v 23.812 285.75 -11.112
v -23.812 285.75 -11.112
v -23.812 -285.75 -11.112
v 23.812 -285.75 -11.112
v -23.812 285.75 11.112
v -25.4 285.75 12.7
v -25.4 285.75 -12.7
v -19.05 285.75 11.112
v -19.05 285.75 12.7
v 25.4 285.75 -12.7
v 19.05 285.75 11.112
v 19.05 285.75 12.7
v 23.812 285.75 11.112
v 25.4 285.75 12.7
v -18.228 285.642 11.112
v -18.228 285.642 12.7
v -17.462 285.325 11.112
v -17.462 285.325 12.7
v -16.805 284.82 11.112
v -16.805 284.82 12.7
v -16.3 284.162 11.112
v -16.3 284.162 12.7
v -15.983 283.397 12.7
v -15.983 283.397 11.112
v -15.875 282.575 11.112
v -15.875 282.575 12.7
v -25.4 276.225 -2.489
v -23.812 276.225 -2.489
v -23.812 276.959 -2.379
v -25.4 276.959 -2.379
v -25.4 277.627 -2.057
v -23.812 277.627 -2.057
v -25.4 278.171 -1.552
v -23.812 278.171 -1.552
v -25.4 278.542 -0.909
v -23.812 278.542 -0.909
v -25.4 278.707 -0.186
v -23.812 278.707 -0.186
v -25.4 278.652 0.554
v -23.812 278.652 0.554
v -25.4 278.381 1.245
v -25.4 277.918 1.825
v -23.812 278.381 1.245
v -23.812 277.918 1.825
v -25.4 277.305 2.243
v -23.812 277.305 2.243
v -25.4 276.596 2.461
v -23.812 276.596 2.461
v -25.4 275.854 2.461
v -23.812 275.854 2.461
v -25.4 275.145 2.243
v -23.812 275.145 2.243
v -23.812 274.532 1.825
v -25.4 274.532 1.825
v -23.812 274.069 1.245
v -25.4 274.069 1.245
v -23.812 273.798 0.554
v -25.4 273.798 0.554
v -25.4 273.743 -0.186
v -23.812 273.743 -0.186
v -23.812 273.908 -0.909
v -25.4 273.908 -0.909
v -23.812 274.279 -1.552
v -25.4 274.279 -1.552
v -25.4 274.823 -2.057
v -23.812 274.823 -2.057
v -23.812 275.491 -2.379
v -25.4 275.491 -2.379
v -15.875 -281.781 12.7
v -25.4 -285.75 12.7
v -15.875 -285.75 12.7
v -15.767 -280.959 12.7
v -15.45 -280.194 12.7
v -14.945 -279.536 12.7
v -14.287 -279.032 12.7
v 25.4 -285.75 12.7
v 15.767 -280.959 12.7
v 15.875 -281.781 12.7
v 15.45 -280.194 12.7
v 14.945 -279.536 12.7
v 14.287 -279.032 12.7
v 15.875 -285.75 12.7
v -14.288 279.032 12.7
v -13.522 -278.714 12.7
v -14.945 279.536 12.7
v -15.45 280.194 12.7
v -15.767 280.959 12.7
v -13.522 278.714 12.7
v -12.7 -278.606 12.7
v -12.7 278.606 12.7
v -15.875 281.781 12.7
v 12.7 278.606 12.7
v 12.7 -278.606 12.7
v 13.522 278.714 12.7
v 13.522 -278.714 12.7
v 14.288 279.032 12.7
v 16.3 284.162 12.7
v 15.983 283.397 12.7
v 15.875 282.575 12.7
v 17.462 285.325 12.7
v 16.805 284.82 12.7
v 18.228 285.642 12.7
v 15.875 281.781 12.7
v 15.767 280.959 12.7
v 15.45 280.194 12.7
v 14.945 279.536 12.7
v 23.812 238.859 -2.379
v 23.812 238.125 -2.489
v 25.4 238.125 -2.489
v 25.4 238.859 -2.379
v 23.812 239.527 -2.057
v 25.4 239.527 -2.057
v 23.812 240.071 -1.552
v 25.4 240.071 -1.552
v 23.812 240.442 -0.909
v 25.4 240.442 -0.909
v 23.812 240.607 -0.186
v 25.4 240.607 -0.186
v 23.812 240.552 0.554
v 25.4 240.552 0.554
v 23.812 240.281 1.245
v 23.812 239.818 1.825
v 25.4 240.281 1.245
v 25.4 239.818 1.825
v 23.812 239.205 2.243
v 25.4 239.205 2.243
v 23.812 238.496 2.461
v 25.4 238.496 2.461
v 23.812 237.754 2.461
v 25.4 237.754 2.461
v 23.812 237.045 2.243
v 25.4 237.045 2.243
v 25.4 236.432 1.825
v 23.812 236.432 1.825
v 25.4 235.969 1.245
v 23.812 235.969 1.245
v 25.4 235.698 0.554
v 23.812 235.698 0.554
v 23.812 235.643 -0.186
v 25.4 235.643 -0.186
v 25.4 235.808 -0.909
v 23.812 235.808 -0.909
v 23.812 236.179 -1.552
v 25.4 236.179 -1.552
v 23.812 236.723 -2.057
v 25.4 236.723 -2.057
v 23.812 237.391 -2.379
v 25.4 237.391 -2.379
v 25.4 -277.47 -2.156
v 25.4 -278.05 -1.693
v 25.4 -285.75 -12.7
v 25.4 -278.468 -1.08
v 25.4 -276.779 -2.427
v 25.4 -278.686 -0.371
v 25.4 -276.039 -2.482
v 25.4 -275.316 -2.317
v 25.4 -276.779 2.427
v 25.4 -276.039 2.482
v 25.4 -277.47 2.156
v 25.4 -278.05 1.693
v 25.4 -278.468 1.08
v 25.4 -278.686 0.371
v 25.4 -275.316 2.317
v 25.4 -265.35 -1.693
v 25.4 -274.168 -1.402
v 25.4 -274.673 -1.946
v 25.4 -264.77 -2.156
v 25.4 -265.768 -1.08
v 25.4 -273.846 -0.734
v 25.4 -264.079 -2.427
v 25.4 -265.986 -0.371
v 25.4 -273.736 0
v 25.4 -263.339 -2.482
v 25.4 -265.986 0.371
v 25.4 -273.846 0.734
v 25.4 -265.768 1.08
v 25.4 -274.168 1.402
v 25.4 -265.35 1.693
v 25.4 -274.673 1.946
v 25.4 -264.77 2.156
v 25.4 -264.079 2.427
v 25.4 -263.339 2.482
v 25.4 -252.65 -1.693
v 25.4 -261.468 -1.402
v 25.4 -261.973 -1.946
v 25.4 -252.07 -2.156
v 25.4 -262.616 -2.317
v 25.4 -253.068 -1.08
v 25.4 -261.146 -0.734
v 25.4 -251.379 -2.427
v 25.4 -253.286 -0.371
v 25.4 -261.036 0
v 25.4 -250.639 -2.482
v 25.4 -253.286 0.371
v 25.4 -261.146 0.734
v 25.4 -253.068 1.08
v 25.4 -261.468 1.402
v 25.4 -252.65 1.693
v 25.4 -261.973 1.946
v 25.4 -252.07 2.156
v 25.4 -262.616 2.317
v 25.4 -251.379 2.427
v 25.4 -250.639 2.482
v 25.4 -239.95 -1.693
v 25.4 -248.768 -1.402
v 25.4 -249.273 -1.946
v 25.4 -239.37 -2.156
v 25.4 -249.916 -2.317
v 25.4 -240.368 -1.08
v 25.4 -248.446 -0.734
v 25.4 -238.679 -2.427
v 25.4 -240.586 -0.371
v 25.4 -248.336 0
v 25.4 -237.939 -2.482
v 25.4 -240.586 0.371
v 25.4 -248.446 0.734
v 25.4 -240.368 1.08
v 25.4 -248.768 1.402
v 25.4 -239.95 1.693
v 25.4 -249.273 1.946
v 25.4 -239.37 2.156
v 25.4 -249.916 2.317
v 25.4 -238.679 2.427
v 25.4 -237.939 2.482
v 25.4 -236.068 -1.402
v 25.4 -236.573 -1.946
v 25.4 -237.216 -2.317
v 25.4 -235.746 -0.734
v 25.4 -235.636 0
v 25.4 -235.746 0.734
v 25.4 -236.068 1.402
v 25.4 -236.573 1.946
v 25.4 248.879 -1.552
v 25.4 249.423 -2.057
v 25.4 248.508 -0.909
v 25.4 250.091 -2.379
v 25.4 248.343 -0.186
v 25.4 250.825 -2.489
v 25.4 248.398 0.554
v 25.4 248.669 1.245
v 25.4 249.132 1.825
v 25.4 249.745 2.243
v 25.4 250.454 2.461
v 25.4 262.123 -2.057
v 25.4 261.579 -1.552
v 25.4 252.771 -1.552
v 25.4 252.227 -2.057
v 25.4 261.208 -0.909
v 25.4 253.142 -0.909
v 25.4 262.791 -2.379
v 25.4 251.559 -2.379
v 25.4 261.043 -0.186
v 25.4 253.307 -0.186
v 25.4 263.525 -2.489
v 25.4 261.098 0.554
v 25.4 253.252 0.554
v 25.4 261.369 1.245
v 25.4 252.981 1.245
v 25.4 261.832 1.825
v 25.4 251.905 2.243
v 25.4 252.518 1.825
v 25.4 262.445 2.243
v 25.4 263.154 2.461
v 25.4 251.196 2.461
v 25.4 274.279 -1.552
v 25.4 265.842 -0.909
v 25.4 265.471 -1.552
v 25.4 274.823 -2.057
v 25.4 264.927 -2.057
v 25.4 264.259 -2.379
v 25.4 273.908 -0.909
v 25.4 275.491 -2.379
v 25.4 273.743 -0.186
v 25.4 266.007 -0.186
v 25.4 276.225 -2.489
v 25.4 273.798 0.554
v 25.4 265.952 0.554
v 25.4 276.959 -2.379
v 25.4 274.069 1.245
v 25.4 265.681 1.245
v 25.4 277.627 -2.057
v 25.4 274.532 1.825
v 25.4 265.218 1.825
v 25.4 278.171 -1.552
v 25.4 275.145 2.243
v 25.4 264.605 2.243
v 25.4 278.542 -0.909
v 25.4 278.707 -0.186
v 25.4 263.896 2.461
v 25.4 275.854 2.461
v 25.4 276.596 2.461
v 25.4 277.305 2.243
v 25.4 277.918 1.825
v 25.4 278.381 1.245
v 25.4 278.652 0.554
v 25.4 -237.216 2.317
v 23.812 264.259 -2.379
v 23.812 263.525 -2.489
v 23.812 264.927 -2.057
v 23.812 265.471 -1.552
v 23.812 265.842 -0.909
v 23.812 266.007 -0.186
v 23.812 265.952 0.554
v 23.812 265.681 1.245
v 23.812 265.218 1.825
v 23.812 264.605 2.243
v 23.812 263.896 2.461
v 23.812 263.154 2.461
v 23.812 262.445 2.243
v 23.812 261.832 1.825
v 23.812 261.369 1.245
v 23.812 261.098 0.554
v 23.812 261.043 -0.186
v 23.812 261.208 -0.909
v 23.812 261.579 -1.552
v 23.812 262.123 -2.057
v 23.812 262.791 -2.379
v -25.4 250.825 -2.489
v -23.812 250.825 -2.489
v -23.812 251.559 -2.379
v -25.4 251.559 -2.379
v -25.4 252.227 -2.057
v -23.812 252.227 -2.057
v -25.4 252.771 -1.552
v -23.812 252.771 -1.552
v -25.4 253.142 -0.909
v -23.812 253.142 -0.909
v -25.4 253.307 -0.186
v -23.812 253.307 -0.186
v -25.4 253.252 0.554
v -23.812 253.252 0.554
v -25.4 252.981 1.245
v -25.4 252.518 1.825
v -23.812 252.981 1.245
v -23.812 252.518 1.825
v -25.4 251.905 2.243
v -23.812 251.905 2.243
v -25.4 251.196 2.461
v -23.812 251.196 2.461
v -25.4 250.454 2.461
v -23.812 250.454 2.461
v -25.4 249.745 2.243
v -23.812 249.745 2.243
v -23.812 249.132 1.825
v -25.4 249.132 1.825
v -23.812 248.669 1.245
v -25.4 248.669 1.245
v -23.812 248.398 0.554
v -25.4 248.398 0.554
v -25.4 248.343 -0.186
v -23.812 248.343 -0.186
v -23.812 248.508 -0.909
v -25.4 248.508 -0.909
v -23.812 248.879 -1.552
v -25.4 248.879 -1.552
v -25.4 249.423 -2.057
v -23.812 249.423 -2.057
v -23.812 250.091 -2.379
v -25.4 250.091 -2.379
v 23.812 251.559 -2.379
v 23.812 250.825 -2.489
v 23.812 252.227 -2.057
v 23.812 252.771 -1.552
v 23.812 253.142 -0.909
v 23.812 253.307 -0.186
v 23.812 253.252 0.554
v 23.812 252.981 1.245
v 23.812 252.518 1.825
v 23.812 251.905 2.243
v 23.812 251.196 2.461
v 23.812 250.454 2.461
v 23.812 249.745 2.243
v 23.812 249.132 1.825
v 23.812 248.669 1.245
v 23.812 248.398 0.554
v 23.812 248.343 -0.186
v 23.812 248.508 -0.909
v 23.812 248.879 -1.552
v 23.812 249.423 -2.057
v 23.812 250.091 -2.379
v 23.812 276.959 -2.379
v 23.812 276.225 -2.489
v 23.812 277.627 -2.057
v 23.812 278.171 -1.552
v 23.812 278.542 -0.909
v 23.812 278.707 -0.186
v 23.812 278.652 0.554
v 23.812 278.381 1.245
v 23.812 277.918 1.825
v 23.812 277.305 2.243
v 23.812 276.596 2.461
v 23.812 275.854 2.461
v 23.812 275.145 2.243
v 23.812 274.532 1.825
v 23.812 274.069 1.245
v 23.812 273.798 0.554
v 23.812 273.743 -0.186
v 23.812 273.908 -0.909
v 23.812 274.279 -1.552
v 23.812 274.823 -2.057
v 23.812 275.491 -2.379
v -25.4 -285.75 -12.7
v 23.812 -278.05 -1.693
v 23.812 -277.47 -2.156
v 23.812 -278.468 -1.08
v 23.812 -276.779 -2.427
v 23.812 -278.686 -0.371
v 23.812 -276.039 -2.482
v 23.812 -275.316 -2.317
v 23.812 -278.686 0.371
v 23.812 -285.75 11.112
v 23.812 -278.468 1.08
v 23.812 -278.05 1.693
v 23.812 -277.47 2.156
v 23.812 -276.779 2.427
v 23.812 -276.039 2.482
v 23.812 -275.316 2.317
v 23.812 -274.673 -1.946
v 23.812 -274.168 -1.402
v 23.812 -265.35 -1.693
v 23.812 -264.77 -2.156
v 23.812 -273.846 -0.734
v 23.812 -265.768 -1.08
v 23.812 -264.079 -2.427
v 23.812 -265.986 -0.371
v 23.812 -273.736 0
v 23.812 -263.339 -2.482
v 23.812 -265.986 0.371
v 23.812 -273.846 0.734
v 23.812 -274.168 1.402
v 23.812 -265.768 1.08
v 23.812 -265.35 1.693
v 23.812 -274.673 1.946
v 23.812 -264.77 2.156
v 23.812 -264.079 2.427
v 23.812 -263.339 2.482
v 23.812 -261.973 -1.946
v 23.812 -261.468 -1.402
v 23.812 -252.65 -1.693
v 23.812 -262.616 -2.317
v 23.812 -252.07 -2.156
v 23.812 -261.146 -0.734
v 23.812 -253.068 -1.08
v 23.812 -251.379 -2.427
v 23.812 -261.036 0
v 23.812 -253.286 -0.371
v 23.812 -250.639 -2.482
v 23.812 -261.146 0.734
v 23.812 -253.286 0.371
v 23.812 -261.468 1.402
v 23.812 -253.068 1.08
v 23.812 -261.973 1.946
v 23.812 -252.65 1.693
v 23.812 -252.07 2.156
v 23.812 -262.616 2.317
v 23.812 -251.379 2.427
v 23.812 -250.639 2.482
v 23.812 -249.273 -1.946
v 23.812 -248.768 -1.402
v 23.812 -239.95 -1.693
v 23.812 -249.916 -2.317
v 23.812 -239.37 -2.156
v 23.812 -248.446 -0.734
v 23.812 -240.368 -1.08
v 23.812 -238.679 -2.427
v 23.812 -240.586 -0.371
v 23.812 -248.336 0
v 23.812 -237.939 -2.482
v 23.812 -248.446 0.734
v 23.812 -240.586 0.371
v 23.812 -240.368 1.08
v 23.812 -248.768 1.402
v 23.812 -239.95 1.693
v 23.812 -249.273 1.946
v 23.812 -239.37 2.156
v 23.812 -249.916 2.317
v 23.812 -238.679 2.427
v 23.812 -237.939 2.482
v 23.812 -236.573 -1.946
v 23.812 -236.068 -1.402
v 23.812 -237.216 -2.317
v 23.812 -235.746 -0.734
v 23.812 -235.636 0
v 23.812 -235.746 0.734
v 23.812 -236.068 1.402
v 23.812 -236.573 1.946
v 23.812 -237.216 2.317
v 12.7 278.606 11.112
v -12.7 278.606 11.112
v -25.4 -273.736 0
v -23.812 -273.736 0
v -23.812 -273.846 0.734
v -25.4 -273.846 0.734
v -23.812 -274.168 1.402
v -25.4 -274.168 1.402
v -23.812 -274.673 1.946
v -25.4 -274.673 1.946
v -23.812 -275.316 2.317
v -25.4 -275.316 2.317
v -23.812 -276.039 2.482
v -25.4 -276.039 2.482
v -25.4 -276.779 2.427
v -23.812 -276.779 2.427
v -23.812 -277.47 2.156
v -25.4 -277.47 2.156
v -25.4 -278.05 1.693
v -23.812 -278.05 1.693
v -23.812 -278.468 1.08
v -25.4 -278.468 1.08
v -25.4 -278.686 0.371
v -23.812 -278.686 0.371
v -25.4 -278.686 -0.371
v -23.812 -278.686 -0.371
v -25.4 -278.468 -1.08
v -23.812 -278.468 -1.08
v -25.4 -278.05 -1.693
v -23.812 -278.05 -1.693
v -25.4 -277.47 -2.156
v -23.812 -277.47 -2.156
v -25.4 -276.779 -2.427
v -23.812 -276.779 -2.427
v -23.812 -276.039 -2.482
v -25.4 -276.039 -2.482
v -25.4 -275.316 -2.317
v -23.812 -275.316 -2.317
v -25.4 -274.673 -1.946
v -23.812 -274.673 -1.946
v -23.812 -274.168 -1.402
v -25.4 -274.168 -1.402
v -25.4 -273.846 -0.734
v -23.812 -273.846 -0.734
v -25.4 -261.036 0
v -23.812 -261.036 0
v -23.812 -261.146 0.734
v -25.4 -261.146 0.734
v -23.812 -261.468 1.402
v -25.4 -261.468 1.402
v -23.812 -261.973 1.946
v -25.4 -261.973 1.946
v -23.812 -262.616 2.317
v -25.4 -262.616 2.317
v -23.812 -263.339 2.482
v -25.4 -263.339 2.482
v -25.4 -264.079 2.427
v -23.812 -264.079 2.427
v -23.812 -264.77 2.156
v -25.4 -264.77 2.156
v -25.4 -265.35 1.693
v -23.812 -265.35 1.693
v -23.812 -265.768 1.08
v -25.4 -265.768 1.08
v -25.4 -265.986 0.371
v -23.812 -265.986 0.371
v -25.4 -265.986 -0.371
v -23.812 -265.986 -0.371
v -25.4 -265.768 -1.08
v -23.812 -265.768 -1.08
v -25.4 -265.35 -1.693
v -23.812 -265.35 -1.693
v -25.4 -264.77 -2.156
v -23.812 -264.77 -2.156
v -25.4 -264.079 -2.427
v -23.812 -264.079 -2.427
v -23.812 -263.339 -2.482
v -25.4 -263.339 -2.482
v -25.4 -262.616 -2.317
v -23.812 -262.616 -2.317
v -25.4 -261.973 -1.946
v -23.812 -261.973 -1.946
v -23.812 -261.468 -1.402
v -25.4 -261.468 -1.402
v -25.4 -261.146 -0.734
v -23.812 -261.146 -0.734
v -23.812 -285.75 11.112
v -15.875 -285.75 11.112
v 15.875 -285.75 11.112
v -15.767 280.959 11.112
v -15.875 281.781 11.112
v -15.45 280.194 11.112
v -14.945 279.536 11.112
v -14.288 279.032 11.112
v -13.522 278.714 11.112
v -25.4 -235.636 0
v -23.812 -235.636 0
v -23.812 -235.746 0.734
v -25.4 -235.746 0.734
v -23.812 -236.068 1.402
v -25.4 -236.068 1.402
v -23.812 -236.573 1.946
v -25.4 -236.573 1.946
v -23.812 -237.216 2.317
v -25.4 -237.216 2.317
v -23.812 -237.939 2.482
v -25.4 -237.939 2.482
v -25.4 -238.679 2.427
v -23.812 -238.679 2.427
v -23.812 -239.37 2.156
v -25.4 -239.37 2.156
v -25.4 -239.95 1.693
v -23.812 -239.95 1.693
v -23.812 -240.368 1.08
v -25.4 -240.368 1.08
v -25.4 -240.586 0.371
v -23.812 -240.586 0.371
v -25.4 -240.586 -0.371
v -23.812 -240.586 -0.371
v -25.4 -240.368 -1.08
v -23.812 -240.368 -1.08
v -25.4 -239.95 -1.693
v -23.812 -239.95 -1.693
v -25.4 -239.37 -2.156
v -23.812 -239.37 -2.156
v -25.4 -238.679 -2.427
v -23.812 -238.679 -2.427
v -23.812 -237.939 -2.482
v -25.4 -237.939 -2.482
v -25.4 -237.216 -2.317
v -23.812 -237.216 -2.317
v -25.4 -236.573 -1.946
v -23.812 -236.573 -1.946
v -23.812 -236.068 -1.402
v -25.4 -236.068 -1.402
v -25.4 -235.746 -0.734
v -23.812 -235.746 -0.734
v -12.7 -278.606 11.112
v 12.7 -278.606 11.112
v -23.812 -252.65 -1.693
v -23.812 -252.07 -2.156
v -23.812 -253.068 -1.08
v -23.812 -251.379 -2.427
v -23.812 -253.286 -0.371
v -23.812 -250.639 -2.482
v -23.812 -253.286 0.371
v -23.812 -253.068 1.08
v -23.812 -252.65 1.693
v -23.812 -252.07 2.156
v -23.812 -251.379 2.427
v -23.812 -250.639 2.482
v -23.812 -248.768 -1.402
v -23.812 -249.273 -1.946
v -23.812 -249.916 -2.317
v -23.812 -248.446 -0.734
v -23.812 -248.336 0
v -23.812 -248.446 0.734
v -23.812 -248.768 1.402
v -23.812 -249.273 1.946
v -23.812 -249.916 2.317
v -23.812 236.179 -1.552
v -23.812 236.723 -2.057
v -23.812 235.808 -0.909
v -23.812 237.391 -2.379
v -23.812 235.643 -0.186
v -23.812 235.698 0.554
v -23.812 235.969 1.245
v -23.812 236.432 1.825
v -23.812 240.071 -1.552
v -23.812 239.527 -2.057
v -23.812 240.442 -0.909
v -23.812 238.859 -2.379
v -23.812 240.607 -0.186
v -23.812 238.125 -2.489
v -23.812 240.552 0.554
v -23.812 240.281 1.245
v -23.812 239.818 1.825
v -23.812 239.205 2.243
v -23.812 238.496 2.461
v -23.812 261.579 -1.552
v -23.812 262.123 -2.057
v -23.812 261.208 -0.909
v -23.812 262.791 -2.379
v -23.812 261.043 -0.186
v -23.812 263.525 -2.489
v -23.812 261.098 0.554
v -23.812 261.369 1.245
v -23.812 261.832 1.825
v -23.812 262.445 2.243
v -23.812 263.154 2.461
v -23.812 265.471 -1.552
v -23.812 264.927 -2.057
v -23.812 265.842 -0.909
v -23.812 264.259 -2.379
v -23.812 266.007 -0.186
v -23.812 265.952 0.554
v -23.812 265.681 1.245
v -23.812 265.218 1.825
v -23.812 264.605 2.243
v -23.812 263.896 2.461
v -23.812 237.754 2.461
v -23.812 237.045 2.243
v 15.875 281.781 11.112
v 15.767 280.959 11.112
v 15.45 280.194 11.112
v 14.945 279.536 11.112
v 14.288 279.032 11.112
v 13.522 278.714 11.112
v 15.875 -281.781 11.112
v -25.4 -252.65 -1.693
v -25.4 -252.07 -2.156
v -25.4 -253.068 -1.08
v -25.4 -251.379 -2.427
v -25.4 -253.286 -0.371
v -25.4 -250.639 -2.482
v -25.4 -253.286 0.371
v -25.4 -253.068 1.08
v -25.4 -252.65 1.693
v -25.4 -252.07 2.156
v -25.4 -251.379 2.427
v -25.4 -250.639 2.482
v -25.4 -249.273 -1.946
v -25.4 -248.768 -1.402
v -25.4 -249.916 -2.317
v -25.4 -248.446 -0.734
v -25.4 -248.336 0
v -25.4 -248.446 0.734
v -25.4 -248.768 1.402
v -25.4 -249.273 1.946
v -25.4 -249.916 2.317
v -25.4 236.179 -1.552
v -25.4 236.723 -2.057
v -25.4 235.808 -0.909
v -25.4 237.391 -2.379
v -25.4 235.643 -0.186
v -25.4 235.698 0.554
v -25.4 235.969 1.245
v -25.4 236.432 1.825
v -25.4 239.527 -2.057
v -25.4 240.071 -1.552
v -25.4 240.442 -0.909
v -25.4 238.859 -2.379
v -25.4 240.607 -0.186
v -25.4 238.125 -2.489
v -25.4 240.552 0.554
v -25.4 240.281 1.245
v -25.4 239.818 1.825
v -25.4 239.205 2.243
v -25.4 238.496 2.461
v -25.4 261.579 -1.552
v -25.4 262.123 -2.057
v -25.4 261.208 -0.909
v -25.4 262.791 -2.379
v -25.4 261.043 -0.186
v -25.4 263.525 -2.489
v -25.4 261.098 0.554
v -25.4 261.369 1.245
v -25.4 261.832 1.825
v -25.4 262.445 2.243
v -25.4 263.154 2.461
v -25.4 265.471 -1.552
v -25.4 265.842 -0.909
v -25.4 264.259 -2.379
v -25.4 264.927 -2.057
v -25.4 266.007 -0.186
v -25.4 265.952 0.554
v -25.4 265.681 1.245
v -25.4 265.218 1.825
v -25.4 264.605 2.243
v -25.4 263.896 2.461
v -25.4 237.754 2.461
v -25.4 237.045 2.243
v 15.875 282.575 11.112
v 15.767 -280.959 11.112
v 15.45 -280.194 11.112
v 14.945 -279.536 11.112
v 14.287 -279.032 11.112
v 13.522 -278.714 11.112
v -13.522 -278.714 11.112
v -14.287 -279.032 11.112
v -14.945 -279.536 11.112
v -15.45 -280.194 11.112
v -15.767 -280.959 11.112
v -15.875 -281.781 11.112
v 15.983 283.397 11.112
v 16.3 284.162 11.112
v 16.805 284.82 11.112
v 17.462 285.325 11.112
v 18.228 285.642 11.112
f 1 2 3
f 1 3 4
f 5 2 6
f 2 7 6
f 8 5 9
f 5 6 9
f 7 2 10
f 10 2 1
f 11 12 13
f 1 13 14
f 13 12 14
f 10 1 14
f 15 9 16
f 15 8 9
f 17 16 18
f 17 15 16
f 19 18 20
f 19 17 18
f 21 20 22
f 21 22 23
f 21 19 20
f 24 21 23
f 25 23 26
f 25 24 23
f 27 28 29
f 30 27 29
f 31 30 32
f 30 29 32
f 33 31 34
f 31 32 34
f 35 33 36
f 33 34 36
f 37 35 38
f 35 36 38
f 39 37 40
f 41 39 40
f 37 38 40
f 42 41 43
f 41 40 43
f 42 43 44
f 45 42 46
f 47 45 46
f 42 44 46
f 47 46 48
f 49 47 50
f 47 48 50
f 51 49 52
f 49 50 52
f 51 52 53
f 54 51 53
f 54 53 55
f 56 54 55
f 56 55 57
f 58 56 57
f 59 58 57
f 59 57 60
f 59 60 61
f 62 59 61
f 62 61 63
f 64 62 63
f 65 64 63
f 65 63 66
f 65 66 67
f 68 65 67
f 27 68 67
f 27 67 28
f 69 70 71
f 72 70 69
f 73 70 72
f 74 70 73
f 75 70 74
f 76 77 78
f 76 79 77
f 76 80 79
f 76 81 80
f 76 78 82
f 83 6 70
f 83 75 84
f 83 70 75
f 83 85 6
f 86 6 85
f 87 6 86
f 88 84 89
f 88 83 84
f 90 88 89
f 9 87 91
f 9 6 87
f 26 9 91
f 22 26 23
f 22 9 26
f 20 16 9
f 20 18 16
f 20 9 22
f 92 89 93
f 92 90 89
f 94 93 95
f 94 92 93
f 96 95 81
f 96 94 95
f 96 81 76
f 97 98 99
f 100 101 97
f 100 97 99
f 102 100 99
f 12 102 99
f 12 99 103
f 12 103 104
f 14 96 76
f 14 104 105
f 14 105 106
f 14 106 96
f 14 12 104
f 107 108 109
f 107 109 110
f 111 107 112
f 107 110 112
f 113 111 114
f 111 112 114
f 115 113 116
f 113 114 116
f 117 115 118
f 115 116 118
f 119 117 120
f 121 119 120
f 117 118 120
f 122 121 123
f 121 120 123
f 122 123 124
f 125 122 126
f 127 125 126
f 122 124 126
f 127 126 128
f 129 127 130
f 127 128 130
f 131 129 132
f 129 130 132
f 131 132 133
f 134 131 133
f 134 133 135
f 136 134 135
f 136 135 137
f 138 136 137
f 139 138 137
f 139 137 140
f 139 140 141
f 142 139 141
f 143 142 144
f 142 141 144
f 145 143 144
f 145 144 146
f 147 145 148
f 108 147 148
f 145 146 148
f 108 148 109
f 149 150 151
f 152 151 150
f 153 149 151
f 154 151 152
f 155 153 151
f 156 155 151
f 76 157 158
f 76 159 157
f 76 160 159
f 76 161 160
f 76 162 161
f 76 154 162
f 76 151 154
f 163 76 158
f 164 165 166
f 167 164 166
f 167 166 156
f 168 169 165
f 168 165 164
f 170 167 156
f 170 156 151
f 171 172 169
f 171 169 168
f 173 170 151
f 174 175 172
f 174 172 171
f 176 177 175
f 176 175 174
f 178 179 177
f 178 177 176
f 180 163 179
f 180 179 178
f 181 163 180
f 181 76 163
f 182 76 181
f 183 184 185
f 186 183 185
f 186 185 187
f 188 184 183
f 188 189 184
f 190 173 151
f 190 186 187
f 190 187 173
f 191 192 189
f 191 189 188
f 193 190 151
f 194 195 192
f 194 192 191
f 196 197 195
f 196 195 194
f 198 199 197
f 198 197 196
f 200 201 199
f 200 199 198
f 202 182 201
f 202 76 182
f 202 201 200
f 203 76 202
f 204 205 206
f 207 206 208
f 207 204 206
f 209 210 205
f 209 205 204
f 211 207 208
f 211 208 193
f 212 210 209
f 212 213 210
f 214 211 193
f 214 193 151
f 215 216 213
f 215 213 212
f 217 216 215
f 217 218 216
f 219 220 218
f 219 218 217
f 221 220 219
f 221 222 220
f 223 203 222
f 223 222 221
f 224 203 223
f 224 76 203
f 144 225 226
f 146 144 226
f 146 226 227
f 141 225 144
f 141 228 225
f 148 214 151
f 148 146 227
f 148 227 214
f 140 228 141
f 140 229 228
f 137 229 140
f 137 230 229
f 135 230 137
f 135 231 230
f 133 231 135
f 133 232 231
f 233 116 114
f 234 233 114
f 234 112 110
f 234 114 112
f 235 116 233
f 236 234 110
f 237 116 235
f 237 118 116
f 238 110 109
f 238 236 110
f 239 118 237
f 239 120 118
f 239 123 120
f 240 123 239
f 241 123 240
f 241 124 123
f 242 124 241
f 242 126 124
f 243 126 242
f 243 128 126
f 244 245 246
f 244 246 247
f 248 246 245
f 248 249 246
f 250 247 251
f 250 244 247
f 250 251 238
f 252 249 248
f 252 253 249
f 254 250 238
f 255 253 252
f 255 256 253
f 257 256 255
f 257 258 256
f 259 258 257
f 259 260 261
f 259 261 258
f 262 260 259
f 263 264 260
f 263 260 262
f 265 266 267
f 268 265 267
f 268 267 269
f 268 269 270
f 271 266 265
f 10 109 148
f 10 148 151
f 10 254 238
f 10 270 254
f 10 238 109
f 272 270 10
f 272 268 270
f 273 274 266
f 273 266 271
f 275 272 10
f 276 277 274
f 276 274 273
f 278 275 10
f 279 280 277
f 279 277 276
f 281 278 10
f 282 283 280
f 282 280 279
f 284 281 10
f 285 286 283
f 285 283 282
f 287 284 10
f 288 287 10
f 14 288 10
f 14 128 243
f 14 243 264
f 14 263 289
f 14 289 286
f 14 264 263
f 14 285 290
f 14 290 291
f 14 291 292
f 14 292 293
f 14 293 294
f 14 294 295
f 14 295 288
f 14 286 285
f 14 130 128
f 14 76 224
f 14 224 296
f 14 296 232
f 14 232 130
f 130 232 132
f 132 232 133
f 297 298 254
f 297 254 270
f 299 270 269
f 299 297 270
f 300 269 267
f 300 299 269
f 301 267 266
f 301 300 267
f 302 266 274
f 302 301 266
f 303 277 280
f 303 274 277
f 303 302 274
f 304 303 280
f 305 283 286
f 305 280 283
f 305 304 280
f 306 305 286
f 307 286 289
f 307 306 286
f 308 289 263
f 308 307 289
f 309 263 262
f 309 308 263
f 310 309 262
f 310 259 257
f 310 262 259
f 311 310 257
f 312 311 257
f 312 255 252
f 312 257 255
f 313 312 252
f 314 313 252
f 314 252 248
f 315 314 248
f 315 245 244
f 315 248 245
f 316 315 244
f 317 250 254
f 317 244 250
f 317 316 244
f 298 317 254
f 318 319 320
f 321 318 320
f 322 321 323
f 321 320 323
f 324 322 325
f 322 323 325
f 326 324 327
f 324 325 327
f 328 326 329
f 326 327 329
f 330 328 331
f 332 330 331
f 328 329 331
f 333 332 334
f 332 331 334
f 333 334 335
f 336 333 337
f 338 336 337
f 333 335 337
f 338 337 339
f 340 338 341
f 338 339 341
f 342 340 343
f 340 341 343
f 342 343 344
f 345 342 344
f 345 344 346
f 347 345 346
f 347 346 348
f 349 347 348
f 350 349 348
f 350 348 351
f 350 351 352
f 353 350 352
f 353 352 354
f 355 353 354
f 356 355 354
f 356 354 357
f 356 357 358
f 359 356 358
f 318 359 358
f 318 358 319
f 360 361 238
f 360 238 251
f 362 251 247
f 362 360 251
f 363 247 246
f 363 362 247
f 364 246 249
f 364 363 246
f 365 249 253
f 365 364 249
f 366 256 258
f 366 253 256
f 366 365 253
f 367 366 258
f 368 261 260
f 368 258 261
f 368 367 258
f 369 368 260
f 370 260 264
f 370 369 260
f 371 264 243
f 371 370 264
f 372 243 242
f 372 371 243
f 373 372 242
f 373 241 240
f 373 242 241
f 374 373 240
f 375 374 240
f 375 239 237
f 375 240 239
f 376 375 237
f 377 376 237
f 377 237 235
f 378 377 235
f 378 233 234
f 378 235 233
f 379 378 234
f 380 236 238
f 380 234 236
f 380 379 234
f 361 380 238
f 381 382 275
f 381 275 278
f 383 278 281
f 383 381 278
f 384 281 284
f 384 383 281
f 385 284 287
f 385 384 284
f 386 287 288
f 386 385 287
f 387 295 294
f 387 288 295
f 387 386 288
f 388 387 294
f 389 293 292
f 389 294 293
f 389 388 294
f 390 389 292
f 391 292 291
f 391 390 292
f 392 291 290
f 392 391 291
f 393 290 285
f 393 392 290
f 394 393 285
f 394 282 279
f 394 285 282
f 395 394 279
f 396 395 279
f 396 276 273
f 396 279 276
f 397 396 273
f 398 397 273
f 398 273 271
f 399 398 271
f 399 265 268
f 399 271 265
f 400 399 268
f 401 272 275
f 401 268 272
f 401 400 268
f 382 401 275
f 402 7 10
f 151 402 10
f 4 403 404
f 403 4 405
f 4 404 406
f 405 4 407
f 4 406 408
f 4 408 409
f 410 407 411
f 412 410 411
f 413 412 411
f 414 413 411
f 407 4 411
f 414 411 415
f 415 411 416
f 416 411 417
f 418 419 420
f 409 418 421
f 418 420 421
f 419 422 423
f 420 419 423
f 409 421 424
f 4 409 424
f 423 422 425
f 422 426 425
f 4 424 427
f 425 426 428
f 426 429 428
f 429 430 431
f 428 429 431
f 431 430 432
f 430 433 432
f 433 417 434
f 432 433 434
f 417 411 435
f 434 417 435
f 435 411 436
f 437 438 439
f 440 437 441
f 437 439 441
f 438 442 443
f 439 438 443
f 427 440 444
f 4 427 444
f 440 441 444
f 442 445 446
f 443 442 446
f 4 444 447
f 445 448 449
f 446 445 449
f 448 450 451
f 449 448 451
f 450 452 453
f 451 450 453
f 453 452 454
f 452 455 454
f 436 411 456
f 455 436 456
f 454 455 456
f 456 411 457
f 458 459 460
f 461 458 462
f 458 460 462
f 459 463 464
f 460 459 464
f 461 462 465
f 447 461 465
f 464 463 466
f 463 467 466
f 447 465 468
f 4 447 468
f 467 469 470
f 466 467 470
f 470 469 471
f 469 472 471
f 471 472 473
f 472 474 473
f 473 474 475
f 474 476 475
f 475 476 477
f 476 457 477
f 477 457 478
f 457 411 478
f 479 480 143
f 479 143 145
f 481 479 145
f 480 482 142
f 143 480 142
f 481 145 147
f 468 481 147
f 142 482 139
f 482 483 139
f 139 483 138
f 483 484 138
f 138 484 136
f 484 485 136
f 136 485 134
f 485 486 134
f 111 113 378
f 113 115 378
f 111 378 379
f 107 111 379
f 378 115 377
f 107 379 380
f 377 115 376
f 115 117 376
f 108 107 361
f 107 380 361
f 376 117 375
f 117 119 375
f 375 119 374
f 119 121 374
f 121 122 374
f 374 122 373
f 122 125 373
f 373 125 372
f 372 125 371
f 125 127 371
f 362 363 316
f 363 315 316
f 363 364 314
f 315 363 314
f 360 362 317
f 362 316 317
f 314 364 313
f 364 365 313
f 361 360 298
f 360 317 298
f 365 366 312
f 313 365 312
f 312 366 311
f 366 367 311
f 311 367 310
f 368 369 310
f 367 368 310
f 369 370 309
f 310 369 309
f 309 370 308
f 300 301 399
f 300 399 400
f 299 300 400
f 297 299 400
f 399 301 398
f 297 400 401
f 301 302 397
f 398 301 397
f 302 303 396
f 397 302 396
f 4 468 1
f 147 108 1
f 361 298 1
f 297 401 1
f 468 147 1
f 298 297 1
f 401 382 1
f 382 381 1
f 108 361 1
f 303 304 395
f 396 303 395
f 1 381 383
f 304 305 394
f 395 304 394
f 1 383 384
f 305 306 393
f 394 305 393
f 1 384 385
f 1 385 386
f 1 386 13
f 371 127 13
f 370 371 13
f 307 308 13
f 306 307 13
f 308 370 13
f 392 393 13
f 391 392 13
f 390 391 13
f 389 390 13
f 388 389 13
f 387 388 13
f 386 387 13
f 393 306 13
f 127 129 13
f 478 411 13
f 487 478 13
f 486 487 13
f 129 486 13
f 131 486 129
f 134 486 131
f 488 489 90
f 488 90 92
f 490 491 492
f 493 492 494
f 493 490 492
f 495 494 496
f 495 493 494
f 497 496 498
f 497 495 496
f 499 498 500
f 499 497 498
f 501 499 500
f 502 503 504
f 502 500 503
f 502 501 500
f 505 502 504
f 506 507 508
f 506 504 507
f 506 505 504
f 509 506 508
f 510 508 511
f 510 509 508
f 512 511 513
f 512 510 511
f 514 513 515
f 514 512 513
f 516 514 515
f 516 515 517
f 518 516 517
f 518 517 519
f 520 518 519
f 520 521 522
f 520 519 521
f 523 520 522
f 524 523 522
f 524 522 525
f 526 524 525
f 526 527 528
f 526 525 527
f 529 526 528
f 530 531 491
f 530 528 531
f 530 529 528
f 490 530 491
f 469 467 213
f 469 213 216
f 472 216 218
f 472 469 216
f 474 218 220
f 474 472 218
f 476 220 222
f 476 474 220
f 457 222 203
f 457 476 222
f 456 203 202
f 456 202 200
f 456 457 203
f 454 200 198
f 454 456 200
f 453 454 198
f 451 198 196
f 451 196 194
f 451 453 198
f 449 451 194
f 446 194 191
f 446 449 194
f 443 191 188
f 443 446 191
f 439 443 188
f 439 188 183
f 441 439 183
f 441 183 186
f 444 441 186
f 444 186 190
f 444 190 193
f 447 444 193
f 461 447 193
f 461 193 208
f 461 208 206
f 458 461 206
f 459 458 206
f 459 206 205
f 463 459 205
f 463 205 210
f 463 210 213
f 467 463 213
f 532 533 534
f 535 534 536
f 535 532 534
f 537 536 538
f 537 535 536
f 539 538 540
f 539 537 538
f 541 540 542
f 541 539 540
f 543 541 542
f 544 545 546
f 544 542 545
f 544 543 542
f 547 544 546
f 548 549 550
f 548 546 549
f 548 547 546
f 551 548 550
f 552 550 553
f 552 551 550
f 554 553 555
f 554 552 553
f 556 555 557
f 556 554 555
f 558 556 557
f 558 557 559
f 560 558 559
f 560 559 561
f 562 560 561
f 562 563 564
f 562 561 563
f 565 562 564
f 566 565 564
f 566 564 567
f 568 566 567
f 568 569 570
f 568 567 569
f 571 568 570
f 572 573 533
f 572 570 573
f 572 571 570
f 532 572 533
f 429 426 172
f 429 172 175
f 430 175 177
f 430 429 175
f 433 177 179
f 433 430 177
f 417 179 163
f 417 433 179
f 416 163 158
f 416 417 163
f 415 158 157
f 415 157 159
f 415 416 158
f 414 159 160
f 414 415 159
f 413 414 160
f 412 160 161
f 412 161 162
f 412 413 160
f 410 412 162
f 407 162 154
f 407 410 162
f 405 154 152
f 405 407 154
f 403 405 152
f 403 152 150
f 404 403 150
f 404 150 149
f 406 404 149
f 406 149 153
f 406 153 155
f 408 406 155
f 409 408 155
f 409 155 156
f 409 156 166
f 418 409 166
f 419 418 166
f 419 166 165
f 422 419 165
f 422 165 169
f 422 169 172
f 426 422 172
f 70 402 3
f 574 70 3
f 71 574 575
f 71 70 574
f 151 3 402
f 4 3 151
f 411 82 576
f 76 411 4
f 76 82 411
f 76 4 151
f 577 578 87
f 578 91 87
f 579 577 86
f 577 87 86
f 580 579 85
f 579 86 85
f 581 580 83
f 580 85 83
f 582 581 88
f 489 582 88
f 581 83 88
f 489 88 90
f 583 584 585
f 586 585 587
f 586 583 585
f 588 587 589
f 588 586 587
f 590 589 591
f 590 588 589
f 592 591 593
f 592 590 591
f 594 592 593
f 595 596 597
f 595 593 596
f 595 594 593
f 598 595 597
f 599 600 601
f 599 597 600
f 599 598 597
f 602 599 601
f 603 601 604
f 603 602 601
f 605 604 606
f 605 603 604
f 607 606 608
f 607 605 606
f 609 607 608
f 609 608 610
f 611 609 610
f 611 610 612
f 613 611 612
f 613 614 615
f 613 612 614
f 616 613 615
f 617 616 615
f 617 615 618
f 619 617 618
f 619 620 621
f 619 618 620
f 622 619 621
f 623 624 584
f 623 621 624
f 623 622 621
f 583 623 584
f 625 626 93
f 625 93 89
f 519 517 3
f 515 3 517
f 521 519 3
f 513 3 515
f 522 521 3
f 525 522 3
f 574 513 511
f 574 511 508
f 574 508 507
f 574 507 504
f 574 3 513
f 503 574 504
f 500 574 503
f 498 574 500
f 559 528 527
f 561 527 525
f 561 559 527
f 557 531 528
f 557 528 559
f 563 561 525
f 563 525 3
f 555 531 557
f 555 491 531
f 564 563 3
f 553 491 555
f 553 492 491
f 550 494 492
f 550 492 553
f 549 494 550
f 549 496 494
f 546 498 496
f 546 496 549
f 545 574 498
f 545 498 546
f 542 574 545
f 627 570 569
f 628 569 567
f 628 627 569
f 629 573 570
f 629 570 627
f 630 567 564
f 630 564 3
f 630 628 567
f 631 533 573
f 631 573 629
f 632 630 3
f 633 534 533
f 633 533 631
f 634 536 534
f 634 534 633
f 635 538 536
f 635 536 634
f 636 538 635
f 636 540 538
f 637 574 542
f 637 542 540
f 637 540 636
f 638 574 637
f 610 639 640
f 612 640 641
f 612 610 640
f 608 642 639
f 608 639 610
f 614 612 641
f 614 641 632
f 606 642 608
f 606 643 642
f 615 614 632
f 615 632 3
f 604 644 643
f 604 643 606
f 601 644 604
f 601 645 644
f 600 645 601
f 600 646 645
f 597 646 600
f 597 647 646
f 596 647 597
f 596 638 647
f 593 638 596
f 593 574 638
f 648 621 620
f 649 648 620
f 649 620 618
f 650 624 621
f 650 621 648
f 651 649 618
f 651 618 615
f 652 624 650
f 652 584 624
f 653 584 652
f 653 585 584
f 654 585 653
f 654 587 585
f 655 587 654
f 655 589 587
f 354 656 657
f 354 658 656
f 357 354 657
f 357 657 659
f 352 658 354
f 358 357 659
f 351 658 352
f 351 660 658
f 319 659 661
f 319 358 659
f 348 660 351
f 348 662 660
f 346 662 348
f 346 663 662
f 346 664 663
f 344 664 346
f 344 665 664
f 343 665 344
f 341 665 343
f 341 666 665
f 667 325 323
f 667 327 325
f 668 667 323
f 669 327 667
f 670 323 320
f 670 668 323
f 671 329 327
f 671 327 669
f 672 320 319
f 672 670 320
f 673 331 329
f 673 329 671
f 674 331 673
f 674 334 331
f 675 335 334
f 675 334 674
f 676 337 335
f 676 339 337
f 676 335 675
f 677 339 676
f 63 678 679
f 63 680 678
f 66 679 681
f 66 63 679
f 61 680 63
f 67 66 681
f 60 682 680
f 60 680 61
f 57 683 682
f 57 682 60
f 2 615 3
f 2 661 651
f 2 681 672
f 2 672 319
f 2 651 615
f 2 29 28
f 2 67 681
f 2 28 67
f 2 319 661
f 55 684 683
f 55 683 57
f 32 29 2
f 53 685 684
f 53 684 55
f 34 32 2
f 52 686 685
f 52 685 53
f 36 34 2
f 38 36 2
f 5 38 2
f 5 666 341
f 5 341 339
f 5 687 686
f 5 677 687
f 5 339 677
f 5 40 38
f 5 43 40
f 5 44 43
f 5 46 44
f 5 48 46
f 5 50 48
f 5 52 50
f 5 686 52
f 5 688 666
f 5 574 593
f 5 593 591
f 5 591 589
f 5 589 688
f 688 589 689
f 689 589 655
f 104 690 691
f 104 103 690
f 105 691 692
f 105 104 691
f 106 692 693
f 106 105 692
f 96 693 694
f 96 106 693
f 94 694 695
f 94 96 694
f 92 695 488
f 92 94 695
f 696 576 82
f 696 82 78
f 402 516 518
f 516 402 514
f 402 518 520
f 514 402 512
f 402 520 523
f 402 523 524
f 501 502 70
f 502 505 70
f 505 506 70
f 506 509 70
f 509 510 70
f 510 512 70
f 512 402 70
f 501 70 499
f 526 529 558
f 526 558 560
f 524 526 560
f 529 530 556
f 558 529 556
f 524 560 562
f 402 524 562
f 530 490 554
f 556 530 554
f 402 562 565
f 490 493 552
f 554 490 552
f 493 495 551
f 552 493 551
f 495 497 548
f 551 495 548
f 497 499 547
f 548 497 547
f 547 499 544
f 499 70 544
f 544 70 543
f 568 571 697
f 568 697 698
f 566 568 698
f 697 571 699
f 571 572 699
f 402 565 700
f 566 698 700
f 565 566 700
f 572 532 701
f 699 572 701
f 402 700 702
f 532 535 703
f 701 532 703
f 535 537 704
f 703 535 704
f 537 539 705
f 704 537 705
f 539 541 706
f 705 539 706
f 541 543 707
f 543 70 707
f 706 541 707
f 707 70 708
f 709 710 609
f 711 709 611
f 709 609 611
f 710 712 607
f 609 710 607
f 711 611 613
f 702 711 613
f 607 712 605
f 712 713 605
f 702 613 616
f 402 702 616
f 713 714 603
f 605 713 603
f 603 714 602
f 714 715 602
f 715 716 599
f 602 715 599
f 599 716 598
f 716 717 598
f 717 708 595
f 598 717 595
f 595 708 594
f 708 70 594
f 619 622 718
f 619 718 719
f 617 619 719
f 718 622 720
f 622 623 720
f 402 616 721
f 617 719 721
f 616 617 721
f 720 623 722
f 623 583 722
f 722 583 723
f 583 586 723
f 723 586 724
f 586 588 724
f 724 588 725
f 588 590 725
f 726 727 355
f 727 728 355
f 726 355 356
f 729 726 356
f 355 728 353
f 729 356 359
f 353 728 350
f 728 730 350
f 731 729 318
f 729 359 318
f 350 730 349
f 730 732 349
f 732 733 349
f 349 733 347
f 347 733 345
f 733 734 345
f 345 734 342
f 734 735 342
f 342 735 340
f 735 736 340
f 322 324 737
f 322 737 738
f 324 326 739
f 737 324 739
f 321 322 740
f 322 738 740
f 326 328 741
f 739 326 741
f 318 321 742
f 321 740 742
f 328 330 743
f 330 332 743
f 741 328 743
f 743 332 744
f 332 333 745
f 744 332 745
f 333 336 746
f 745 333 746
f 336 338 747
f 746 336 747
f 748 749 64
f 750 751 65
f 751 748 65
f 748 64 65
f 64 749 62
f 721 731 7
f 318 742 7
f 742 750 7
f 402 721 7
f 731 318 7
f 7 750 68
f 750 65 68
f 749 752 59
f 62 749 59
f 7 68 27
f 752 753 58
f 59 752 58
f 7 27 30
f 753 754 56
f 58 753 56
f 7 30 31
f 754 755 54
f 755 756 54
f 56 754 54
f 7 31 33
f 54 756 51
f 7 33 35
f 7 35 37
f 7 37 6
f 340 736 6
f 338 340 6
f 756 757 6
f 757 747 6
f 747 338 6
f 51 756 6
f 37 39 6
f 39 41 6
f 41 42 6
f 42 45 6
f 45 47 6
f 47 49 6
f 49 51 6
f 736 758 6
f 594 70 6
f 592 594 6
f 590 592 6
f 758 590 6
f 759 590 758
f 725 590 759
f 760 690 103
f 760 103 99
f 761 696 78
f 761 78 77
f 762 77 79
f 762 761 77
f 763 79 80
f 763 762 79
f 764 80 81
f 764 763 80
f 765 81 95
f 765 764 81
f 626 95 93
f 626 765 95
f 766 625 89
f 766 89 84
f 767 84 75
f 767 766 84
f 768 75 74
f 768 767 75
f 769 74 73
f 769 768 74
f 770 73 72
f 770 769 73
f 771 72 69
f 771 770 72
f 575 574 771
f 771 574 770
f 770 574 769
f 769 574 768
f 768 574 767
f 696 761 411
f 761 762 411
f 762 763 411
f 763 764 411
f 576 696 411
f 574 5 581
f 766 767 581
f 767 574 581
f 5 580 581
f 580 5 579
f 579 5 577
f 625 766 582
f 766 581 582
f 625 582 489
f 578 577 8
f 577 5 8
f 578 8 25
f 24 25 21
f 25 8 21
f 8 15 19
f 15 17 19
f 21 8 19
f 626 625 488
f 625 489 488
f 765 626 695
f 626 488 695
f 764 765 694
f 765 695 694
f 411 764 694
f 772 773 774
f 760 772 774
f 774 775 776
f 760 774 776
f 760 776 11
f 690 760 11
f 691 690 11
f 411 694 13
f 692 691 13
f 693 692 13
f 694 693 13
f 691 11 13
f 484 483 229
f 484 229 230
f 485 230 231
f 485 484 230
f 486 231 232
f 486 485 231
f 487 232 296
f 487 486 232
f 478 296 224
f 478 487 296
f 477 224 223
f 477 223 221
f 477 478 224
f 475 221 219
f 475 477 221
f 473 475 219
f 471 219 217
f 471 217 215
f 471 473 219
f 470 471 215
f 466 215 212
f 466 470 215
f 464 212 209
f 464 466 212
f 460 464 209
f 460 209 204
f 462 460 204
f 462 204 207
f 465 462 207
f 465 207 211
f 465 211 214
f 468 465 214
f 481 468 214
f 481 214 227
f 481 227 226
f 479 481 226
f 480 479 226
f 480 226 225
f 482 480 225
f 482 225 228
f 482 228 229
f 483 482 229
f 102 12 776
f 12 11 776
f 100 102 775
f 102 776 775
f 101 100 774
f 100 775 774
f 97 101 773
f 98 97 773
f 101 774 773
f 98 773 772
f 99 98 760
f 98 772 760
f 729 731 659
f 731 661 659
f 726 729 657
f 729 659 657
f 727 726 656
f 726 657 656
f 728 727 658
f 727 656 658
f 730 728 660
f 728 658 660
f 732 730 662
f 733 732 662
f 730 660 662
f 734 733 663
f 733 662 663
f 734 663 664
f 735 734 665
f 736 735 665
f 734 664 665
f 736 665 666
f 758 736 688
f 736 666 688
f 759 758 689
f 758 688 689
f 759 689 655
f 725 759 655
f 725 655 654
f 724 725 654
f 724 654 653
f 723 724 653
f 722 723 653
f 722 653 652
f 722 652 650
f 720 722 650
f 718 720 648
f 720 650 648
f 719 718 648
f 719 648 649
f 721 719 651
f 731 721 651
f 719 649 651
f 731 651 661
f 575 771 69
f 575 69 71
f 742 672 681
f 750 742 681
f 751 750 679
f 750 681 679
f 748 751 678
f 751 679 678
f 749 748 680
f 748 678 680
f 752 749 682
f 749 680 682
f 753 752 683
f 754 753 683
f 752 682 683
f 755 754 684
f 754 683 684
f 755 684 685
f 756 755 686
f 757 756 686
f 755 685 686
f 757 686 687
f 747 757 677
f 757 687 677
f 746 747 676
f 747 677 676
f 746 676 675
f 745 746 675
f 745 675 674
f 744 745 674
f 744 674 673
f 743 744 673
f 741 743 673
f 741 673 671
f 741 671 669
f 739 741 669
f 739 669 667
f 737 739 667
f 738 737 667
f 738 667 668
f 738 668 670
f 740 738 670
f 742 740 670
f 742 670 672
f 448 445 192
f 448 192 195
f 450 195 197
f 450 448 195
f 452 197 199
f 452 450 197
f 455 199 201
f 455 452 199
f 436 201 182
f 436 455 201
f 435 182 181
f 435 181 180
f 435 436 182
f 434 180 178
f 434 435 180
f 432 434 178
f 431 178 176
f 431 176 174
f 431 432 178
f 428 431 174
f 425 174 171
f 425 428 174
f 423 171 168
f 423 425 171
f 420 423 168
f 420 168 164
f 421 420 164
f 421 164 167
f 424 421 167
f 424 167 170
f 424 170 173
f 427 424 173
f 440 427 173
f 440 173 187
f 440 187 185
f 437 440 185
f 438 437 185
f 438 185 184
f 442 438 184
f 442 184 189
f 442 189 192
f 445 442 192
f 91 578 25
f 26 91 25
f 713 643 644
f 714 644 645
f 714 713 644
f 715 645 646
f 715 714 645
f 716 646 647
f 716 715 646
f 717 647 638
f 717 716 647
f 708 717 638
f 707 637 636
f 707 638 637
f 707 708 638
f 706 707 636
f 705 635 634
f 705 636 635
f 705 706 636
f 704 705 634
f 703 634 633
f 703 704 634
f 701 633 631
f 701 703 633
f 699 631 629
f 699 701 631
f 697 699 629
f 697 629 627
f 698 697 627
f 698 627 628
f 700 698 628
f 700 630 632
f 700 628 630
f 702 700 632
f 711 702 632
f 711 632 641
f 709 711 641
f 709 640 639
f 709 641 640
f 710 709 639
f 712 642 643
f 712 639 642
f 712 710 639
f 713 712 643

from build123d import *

# Parameters (mm, degrees)
SKETCH1_W           = 50.8
SKETCH1_H           = 571.5
BOSS_EXTRUDE1_DEPTH = 12.7
SHELL1_T            = -1.5875
SKETCH5_W           = 31.75
SKETCH5_H           = 26.9875
CUT_EXTRUDE4_DEPTH  = 288.157643987
FILLET2_R           = 3.175
SKETCH3_R           = 2.4892
CUT_EXTRUDE5_DEPTH  = 288.157643987
MIRROR2_START       = 11.1125
MIRROR2_DEPTH       = 1.5875
MIRROR2_START_2     = -25.4
MIRROR2_2_OUTLINE_R = 2.4892
MIRROR2_2_DEPTH     = 50.8


# Read off the part's stored shape, not the designer's step: Mirror2
with BuildPart() as part:
    # Sketch1 → Boss-Extrude1 (new, symmetric)
    with BuildSketch(Plane.XY):
        Rectangle(SKETCH1_W, SKETCH1_H)
    extrude(amount=BOSS_EXTRUDE1_DEPTH, both=True)

    # Shell1
    shell1_openings = [part.faces().sort_by_distance(p)[0] for p in [
        (0, -285.75, 0),
        (0, 285.75, 0),
    ]]
    offset(amount=SHELL1_T, openings=shell1_openings, kind=Kind.INTERSECTION)

    # Sketch5 → Cut-Extrude4 (cut, through all)
    with BuildSketch(Plane.XY):
        with Locations((0, 292.1)):
            Rectangle(SKETCH5_W, SKETCH5_H)
    extrude(amount=CUT_EXTRUDE4_DEPTH, mode=Mode.SUBTRACT)

    # Fillet2
    fillet2_edges = [part.edges().sort_by_distance(p)[0] for p in [
        (15.875, 278.60625, 11.90625),
        (15.875, 285.75, 11.90625),
        (-15.875, 285.75, 11.90625),
        (-15.875, 278.60625, 11.90625),
    ]]
    fillet(fillet2_edges, radius=FILLET2_R)

    # Sketch3 → Cut-Extrude5 (cut, symmetric)
    with BuildSketch(Plane(origin=(0, 0, 0), x_dir=(0, 0, -1), z_dir=(1, 0, 0))):
        with Locations((0, 276.225)):
            Circle(SKETCH3_R)
        with Locations((0, 263.525)):
            Circle(SKETCH3_R)
        with Locations((0, 250.825)):
            Circle(SKETCH3_R)
        with Locations((0, 238.125)):
            Circle(SKETCH3_R)
    extrude(amount=CUT_EXTRUDE5_DEPTH, both=True, mode=Mode.SUBTRACT)

    # Mirror2 outline → Mirror2 (cut)
    with BuildSketch(Plane.XY.offset(MIRROR2_START)):
        with BuildLine():
            Line((-15.875, -285.75), (15.875, -285.75))
            Line((15.875, -285.75), (15.875, -281.78125))
            ThreePointArc((15.875, -281.78125), (14.94506403, -279.53618597), (12.7, -278.60625))
            Line((12.7, -278.60625), (-12.7, -278.60625))
            ThreePointArc((-12.7, -278.60625), (-14.94506403, -279.53618597), (-15.875, -281.78125))
            Line((-15.875, -281.78125), (-15.875, -285.75))
        make_face()
    extrude(amount=MIRROR2_DEPTH, mode=Mode.SUBTRACT)

    # Mirror2 2 outline → Mirror2 2 (cut)
    with BuildSketch(Plane.YZ.offset(MIRROR2_START_2)):
        with Locations((-238.125, 0)):
            Circle(MIRROR2_2_OUTLINE_R)
        with Locations((-250.825, 0)):
            Circle(MIRROR2_2_OUTLINE_R)
        with Locations((-263.525, 0)):
            Circle(MIRROR2_2_OUTLINE_R)
        with Locations((-276.225, 0)):
            Circle(MIRROR2_2_OUTLINE_R)
    extrude(amount=MIRROR2_2_DEPTH, mode=Mode.SUBTRACT)


solid = part.part
